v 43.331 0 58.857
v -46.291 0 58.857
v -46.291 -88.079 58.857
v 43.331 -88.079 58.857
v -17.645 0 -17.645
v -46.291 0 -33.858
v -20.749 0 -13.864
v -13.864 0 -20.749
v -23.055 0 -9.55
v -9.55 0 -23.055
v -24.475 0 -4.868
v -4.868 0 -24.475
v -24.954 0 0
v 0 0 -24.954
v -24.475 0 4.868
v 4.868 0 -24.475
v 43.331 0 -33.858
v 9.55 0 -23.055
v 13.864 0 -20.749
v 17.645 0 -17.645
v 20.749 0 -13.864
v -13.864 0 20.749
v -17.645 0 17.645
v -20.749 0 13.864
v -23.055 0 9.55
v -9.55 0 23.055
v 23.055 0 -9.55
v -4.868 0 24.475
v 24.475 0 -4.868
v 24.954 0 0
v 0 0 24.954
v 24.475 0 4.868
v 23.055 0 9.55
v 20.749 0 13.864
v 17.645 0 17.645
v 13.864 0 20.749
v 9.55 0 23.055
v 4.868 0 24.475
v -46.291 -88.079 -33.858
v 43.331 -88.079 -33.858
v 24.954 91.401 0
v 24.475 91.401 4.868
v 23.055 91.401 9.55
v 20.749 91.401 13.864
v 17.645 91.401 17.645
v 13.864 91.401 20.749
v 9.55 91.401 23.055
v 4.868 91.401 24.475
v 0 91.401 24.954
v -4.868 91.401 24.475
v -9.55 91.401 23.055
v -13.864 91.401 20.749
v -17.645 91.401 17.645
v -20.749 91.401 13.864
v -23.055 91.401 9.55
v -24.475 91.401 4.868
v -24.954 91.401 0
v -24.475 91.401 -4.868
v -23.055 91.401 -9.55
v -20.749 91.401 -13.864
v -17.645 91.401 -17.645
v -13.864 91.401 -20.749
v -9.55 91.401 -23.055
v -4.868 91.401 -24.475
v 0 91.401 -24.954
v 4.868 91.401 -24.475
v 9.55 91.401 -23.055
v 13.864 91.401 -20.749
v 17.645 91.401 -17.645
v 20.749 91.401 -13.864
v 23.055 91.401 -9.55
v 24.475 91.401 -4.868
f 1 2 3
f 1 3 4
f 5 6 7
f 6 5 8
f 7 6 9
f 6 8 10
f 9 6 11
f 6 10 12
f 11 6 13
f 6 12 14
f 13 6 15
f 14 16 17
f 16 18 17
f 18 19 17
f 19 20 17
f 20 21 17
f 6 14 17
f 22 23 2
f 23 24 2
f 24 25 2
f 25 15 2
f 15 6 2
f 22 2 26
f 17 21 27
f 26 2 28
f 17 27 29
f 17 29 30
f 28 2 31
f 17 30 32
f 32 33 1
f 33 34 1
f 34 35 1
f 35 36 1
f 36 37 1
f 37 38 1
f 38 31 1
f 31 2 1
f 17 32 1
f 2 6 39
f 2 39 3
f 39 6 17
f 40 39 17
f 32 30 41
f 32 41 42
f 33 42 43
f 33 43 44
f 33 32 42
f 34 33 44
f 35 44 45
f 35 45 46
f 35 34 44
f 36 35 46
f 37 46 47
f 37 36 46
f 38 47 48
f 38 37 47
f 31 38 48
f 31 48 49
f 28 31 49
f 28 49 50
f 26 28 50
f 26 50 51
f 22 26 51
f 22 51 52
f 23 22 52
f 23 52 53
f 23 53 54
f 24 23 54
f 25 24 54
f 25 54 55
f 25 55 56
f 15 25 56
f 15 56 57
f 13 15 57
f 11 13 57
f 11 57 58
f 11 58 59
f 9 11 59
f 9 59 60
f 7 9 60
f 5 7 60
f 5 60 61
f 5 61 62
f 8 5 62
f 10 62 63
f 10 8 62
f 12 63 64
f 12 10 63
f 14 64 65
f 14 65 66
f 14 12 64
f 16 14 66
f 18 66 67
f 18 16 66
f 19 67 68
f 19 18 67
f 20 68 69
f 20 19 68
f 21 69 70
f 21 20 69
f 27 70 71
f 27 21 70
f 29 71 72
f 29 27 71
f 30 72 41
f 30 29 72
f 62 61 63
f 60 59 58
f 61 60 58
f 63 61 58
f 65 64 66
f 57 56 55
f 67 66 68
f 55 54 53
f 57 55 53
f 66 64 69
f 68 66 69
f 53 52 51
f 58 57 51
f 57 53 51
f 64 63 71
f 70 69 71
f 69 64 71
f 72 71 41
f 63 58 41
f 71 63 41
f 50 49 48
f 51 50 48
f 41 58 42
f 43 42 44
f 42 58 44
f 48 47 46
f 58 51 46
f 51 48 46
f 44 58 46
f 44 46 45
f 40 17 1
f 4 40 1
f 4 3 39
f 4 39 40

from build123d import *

# Parameters (mm, degrees)
F0_W     = 89.622184
F0_H     = 92.715051
F1_DEPTH = 88.079302
F2_R     = 24.954129
F3_DEPTH = 179.480271


with BuildPart() as f1:
    # F0 (on Front) → F1 (new body)
    with BuildSketch(Plane.XZ):
        with Locations((-1.479607, 12.499084)):
            Rectangle(F0_W, F0_H)
    extrude(amount=F1_DEPTH)

    # F2 (on face) → F3 (join)
    with BuildSketch(Plane.XZ.offset(88.079302)):
        Circle(F2_R)
    extrude(amount=-F3_DEPTH)


solid = f1.part
